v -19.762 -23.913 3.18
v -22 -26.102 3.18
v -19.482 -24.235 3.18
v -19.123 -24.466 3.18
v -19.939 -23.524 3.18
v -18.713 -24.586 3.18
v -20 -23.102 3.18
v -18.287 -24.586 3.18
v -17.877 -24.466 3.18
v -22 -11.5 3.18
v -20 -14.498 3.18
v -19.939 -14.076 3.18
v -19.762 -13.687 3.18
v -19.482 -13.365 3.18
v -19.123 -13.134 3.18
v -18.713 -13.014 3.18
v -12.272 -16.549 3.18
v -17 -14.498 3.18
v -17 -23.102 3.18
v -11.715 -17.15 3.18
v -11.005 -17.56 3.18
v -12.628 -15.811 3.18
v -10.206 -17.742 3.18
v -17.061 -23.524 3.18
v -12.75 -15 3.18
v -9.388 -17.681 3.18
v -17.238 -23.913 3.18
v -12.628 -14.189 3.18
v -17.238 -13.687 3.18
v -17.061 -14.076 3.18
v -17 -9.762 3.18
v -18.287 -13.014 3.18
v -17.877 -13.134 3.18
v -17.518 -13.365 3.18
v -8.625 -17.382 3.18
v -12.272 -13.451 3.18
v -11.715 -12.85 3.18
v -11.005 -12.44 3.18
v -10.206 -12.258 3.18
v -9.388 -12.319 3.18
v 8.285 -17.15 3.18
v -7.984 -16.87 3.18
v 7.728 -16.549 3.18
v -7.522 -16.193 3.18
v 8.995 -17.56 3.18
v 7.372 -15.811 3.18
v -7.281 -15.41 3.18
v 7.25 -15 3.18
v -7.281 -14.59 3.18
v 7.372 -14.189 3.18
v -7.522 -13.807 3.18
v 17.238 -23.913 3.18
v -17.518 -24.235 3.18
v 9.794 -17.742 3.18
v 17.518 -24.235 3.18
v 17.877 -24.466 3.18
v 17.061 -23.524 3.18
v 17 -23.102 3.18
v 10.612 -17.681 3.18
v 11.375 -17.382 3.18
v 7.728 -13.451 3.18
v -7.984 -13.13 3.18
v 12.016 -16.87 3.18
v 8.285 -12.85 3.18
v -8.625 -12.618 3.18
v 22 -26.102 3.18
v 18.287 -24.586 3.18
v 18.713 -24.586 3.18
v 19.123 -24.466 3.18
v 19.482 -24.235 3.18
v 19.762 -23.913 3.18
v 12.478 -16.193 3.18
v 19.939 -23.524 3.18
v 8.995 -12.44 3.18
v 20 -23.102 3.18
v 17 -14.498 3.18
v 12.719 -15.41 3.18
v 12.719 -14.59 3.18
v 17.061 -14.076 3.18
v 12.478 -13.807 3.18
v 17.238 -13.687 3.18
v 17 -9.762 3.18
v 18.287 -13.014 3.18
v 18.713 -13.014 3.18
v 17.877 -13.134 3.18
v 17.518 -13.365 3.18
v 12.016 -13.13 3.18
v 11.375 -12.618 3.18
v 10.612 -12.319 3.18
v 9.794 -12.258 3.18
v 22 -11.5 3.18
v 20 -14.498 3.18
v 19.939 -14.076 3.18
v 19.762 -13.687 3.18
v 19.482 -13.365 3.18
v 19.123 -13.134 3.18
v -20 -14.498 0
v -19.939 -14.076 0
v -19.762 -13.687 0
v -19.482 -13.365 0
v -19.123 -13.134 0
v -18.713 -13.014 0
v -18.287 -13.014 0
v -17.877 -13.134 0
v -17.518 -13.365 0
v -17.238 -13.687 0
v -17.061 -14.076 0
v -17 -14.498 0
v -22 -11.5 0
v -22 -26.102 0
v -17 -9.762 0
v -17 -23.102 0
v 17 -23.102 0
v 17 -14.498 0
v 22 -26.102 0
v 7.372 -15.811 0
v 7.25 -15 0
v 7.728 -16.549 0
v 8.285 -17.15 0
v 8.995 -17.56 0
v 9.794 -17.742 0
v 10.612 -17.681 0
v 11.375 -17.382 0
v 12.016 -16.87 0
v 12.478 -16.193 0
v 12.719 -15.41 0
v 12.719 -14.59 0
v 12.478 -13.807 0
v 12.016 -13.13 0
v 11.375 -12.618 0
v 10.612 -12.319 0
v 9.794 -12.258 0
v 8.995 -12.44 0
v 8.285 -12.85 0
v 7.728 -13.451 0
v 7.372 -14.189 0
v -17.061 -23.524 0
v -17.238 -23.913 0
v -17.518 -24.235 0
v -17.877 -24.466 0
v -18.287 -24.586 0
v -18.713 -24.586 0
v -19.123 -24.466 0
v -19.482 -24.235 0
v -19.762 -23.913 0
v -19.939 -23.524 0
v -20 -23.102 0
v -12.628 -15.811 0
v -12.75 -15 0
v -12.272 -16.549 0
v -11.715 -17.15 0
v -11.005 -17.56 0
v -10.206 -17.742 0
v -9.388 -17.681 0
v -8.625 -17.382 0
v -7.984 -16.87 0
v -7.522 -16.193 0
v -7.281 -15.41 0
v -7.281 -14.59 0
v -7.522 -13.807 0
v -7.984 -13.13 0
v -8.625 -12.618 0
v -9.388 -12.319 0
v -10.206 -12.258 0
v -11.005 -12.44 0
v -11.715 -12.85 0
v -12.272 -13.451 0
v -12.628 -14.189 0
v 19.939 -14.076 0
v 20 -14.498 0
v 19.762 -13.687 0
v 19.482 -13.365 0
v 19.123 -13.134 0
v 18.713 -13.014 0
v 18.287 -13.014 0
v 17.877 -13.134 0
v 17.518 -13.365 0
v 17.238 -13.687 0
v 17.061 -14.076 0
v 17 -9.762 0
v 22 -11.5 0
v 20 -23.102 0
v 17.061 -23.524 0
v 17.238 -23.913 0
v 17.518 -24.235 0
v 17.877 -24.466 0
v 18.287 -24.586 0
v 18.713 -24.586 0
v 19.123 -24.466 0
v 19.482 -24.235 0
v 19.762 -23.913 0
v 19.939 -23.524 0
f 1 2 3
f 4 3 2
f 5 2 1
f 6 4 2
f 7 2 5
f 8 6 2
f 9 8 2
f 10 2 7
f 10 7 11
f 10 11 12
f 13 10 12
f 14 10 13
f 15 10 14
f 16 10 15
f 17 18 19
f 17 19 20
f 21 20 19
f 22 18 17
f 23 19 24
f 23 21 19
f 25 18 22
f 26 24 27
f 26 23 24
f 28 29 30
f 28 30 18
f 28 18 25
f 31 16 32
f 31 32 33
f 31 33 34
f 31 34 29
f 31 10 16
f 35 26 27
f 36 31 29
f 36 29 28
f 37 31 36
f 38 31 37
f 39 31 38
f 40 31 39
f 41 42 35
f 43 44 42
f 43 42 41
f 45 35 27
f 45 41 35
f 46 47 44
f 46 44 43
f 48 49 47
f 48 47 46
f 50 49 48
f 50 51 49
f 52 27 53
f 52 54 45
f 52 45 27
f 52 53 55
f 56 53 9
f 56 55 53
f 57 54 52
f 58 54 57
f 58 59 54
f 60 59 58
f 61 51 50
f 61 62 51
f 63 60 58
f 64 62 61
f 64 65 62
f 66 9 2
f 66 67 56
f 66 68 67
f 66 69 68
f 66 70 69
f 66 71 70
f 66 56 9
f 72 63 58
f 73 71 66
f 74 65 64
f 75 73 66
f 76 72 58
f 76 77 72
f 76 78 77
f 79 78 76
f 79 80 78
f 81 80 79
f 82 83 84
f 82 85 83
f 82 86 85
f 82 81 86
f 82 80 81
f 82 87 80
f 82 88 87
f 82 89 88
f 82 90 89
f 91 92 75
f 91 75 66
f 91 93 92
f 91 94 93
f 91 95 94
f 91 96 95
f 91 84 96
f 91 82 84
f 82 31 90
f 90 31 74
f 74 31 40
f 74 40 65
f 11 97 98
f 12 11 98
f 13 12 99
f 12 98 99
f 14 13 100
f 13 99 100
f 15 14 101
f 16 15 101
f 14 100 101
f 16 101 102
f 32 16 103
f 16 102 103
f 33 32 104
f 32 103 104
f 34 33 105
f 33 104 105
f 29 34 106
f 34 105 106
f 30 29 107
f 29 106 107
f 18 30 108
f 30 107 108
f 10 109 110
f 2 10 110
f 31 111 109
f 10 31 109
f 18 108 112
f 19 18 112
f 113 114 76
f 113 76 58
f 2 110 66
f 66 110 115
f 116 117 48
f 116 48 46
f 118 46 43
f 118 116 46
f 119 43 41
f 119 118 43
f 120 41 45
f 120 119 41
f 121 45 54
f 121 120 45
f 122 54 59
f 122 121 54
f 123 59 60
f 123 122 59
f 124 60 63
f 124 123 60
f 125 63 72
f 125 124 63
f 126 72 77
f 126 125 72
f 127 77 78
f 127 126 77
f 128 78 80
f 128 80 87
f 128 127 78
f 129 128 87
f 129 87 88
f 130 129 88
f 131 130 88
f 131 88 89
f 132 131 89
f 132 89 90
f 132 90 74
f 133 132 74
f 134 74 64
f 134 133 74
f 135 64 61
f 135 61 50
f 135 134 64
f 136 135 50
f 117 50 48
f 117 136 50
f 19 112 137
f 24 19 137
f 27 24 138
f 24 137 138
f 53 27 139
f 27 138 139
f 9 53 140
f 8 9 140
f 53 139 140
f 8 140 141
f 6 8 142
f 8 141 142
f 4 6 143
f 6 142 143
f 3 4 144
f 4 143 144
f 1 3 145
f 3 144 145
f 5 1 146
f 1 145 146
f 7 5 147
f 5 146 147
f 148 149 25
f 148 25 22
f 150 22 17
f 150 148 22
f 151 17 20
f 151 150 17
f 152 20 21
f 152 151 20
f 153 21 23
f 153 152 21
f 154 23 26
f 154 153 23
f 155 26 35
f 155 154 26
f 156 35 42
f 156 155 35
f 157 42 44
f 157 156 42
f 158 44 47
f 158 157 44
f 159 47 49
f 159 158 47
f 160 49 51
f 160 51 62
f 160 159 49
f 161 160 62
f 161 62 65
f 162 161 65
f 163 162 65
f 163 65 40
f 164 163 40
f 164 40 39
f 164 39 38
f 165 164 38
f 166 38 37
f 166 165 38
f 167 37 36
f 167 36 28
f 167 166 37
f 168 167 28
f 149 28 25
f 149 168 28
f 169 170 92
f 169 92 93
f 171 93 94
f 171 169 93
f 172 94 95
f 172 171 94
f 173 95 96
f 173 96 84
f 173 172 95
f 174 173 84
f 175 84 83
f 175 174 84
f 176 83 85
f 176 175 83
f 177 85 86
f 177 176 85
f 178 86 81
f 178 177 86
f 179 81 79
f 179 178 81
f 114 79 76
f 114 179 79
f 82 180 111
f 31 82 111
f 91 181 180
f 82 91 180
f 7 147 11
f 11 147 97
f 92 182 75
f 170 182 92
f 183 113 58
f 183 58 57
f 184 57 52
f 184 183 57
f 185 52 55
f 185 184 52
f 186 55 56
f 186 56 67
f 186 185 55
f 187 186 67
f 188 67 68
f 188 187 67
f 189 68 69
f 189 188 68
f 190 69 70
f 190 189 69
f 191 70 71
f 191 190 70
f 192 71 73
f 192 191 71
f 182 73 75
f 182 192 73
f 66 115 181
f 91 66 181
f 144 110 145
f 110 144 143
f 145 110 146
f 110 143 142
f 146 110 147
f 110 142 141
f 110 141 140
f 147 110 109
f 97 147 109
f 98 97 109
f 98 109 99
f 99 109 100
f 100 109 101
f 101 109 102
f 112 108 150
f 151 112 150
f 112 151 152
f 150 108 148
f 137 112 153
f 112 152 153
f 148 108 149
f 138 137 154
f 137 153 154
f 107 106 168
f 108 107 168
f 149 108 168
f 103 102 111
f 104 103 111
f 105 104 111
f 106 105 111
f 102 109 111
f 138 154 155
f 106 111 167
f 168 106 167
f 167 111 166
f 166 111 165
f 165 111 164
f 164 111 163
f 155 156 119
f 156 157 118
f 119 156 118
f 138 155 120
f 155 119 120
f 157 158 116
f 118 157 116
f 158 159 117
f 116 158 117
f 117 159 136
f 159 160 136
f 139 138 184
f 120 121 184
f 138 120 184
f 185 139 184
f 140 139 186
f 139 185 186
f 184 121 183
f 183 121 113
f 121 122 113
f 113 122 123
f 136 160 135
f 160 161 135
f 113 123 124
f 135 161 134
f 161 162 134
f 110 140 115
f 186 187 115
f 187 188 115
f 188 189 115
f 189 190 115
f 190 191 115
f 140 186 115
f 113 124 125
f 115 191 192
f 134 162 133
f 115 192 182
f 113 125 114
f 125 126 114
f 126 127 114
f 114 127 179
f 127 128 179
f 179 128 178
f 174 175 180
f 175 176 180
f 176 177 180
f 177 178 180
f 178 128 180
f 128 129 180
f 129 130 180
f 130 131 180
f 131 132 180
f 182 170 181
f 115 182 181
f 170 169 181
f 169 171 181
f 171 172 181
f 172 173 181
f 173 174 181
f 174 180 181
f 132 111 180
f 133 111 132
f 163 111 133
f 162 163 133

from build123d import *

# Parameters (mm, degrees)
SKETCH1_R           = 2.75
BOSS_EXTRUDE1_DEPTH = 3.18


with BuildPart() as part:
    # Sketch1 → Boss-Extrude1 (new body)
    with BuildSketch(Plane.XY):
        Polygon((-22, -26.101619014), (22, -26.101619014), (22, -11.5), (17, -9.761557864), (-17, -9.761557864), (-22, -11.5), align=None)
        with Locations(Location((10, -15, 0), (0, 0, 180))):
            Circle(SKETCH1_R, mode=Mode.SUBTRACT)
        with Locations(Location((-10, -15, 0), (0, 0, 180))):
            Circle(SKETCH1_R, mode=Mode.SUBTRACT)
        with BuildLine():
            Line((20, -23.101619014), (20, -14.498380986))
            ThreePointArc((20, -14.498380986), (18.5, -12.998380986), (17, -14.498380986))
            Line((17, -14.498380986), (17, -23.101619014))
            ThreePointArc((17, -23.101619014), (18.5, -24.601619014), (20, -23.101619014))
        make_face(mode=Mode.SUBTRACT)
        with BuildLine():
            Line((-20, -23.101619014), (-20, -14.498380986))
            ThreePointArc((-20, -14.498380986), (-18.5, -12.998380986), (-17, -14.498380986))
            Line((-17, -14.498380986), (-17, -23.101619014))
            ThreePointArc((-17, -23.101619014), (-18.5, -24.601619014), (-20, -23.101619014))
        make_face(mode=Mode.SUBTRACT)
    extrude(amount=BOSS_EXTRUDE1_DEPTH)


solid = part.part
